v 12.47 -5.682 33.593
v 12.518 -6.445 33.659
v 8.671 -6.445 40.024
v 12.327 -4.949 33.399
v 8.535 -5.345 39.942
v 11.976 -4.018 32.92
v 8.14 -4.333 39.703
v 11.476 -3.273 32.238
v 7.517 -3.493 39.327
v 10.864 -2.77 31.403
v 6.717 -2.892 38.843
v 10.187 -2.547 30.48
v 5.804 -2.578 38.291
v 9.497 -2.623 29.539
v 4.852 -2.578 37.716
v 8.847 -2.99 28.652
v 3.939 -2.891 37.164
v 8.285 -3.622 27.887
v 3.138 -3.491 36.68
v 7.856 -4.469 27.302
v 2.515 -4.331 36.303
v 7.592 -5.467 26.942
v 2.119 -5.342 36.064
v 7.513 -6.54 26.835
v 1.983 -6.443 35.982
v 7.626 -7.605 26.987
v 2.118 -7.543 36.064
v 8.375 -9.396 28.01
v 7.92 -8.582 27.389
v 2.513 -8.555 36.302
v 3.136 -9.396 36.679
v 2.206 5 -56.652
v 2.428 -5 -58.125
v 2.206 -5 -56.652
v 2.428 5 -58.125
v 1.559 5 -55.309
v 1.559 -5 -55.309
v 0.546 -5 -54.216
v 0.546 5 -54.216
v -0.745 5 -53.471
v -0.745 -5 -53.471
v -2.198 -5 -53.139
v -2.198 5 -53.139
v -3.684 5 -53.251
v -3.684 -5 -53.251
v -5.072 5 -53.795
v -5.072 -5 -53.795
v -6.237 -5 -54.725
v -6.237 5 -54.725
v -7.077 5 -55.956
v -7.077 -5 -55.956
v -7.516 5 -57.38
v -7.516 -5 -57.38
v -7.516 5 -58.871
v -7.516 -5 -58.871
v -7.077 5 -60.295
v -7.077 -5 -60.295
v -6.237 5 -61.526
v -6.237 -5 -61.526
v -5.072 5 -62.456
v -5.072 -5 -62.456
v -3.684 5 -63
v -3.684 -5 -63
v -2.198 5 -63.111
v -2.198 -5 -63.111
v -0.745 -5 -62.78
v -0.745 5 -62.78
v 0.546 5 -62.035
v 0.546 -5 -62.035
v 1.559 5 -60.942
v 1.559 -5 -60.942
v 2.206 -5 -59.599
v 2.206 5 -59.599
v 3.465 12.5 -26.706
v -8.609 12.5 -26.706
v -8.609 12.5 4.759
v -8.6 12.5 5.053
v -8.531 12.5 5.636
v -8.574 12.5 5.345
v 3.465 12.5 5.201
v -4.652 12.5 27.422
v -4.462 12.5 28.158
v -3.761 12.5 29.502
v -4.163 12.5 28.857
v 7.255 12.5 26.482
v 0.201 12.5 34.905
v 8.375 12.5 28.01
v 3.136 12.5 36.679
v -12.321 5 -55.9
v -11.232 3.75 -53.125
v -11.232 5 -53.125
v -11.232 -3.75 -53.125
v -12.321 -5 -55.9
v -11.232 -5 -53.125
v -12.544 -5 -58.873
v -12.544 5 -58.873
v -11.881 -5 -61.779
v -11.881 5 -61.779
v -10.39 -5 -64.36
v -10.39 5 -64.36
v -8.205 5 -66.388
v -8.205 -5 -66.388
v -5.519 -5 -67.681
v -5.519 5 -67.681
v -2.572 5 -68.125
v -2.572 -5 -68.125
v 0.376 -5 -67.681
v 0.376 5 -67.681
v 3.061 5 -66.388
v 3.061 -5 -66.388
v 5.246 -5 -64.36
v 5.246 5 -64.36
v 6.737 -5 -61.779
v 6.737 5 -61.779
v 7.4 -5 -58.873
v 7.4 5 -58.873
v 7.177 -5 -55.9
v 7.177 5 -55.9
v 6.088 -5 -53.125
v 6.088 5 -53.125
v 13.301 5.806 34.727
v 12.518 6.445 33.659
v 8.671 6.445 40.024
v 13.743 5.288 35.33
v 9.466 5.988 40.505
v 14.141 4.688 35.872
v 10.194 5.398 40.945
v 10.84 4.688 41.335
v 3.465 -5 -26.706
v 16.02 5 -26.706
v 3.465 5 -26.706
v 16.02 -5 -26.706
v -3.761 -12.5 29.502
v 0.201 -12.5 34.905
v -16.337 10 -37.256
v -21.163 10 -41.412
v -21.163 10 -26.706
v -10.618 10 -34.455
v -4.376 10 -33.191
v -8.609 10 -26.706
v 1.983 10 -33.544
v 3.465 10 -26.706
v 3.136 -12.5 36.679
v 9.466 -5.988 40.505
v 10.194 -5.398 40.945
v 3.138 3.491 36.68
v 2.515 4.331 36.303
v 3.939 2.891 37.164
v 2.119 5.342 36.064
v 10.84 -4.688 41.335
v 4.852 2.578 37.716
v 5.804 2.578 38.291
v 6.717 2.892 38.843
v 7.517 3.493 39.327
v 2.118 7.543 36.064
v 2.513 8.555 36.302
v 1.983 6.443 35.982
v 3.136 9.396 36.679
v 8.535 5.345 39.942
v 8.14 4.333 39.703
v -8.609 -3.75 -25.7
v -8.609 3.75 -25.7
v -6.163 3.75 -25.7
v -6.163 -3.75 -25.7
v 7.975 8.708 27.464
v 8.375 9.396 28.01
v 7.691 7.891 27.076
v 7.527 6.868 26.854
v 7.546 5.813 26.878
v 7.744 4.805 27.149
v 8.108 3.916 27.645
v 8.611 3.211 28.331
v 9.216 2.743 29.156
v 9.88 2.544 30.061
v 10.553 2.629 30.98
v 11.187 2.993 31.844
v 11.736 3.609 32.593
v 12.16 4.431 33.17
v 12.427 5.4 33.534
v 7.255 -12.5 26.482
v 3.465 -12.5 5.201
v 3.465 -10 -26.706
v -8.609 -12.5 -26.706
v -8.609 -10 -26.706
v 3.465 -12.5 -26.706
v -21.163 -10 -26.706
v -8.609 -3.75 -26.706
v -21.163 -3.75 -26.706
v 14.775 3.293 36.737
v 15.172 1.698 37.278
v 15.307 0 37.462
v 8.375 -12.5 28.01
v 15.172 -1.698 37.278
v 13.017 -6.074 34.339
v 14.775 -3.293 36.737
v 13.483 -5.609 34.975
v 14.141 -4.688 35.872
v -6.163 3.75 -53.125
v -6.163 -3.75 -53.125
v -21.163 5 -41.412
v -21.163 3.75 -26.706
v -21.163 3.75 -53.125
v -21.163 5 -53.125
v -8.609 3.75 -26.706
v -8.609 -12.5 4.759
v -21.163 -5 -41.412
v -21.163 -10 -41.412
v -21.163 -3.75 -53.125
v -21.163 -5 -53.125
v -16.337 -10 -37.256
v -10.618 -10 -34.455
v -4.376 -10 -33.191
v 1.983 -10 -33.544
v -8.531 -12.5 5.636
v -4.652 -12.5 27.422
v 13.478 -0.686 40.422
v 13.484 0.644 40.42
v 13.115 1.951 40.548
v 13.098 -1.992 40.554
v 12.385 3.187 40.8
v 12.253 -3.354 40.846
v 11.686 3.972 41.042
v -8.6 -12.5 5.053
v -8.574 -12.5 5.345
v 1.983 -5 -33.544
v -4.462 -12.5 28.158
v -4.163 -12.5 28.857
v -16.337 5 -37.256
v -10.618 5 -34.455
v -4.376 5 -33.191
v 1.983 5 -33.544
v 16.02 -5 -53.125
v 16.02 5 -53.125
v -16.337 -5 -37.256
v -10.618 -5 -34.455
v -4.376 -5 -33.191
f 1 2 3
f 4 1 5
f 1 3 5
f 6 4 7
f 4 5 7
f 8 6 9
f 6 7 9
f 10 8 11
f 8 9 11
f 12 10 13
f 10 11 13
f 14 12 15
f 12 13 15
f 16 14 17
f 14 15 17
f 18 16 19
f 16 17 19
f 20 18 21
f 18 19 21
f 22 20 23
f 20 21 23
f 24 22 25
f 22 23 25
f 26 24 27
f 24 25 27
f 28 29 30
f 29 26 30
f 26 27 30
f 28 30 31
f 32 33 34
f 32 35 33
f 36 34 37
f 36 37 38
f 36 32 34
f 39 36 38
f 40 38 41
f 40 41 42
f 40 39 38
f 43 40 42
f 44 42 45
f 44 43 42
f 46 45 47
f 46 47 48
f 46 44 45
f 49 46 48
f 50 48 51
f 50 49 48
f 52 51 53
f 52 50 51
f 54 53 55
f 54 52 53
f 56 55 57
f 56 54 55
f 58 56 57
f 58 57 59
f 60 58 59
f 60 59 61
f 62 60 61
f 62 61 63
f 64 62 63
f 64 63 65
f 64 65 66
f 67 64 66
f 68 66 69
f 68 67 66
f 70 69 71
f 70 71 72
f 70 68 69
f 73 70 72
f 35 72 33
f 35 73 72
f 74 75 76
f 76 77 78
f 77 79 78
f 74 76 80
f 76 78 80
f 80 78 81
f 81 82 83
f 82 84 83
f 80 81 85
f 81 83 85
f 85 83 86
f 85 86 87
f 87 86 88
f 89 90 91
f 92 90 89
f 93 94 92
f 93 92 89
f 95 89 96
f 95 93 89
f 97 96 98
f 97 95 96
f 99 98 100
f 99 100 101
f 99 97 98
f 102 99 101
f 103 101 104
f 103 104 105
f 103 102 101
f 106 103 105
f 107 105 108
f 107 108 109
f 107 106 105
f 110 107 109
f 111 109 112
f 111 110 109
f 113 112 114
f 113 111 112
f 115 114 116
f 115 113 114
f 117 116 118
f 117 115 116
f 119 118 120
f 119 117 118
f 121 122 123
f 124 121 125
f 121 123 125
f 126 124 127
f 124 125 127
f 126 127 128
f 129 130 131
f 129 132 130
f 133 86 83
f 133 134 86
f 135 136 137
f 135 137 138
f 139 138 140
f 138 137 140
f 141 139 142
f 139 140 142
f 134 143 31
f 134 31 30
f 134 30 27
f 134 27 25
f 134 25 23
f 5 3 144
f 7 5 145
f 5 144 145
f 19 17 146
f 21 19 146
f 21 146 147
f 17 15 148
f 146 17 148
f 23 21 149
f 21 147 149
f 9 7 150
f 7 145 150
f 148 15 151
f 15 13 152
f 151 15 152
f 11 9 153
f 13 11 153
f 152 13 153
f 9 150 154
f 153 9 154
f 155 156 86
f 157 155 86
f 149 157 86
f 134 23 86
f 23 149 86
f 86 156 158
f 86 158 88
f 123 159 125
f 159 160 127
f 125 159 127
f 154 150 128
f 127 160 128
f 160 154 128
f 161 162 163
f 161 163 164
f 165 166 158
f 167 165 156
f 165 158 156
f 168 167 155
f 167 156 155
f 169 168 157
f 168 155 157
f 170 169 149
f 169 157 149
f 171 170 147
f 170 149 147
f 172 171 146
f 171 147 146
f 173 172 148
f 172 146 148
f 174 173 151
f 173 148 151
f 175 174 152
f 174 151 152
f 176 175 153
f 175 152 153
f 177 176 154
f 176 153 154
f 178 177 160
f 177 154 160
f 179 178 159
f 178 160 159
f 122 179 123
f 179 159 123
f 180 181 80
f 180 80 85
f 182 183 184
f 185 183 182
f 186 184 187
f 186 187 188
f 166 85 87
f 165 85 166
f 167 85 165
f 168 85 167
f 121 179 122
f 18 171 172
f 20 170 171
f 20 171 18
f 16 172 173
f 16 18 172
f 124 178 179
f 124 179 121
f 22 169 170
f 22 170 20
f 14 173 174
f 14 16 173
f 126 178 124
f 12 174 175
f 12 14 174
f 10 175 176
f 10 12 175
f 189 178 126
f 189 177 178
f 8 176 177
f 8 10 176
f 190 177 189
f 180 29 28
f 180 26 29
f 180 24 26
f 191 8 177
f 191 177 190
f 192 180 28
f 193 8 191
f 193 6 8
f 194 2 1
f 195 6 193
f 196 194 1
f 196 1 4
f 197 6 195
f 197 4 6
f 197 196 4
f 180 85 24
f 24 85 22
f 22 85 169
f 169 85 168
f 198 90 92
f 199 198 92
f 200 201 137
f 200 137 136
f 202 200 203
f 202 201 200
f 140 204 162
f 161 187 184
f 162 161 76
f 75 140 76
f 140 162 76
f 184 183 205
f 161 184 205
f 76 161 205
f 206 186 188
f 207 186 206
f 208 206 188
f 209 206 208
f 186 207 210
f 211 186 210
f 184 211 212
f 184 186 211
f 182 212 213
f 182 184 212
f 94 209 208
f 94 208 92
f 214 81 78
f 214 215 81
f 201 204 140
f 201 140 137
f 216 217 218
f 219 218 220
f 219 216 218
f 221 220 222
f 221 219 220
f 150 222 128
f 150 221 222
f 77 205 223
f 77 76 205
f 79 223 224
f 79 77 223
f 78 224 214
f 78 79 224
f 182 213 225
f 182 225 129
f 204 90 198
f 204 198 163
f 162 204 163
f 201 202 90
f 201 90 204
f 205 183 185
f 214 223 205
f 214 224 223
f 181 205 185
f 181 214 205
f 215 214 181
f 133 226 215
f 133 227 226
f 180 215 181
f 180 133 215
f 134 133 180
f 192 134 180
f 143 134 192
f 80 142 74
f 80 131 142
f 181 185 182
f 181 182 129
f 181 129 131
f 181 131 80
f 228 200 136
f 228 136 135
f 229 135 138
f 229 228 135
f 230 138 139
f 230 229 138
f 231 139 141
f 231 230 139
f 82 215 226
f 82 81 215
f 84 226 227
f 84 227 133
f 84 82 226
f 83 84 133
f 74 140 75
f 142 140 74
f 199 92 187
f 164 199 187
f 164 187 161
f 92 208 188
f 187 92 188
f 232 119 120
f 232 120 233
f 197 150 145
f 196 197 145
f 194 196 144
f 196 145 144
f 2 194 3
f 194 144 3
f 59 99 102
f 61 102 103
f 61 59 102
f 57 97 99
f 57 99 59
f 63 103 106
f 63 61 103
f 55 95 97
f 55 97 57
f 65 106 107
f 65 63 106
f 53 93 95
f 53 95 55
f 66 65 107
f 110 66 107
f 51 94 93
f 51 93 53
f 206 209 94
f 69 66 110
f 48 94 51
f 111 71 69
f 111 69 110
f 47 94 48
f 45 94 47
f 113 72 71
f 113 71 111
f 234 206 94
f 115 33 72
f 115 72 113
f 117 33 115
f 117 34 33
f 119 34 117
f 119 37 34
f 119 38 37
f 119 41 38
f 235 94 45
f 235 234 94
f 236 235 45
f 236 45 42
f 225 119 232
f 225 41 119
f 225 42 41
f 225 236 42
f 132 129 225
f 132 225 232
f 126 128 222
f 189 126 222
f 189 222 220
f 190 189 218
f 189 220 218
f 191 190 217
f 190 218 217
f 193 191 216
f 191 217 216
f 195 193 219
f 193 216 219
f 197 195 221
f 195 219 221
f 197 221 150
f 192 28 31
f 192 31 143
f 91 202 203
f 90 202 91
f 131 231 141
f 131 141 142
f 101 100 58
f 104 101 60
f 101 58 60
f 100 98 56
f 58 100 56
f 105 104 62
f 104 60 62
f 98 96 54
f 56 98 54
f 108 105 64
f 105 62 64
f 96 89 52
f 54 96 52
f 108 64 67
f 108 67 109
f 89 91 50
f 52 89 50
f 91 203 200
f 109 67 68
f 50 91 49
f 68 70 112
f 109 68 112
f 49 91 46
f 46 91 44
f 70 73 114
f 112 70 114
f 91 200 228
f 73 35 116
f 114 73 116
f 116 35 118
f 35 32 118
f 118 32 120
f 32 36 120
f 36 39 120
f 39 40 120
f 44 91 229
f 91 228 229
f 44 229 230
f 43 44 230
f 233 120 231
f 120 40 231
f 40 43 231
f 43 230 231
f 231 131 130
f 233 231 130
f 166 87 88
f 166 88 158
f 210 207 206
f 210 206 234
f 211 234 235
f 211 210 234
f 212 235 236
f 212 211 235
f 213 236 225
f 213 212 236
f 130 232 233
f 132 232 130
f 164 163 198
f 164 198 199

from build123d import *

# Parameters (mm, degrees)
F1_DEPTH = 10
F0_R     = 5
F2_DEPTH = 5
F0_W     = 12.0738212518
F0_H     = 31.9068175741
F3_DEPTH = 12.5
F4_R     = 5
F5_SIZE2 = 5
F5_SIZE  = 10
F7_DEPTH = 25
F8_W     = 7.5
F8_H     = 27.4257330972
F9_DEPTH = 15


with BuildPart() as f1:
    # F0 (on Front) → F1 (new body, symmetric)
    with BuildSketch(Plane.XZ):
        with BuildLine():
            Line((-21.1634319276, -26.7058201134), (-21.1634319276, -41.4115685539))
            ThreePointArc((-21.1634319276, -41.4115685539), (-10.6175206449, -34.455488704), (1.9829672237, -33.5438982608))
            Line((1.9829672237, -33.5438982608), (3.4650283433, -26.7058201134))
            Line((3.4650283433, -26.7058201134), (-8.6087929085, -26.7058201134))
            Line((-8.6087929085, -26.7058201134), (-21.1634319276, -26.7058201134))
        make_face()
    extrude(amount=F1_DEPTH, both=True)

    # F0 (on Front) → F2 (join, symmetric)
    with BuildSketch(Plane.XZ):
        with BuildLine():
            Line((-21.1634319276, -41.4115685539), (-21.1634319276, -53.1254634261))
            Line((-21.1634319276, -53.1254634261), (-19.8923903583, -53.1254634261))
            Line((-19.8923903583, -53.1254634261), (-11.2321363204, -53.1254634261))
            ThreePointArc((-11.2321363204, -53.1254634261), (-2.5718822826, -68.1254634261), (6.0883717553, -53.1254634261))
            Line((6.0883717553, -53.1254634261), (14.7486257931, -53.1254634261))
            Line((14.7486257931, -53.1254634261), (16.0196673624, -53.1254634261))
            Line((16.0196673624, -53.1254634261), (16.0196673624, -41.4115685539))
            ThreePointArc((16.0196673624, -41.4115685539), (9.6516199724, -36.3175292593), (1.9829672237, -33.5438982608))
            ThreePointArc((1.9829672237, -33.5438982608), (-10.6175206449, -34.455488704), (-21.1634319276, -41.4115685539))
        make_face()
        with Locations((-2.5718822826, -58.1254634261)):
            Circle(F0_R, mode=Mode.SUBTRACT)
        with BuildLine():
            Line((3.4650283433, -26.7058201134), (1.9829672237, -33.5438982608))
            ThreePointArc((1.9829672237, -33.5438982608), (9.6516199724, -36.3175292593), (16.0196673624, -41.4115685539))
            Line((16.0196673624, -41.4115685539), (16.0196673624, -26.7058201134))
            Line((16.0196673624, -26.7058201134), (3.4650283433, -26.7058201134))
        make_face()
    extrude(amount=F2_DEPTH, both=True)

    # F0 (on Front) → F3 (join, symmetric)
    with BuildSketch(Plane.XZ):
        with Locations((-2.5718822826, -10.7524113264)):
            Rectangle(F0_W, F0_H)
        Polygon((-4.447942134, 28.565781191), (-8.6087929085, 5.2009974606), (3.4650283433, 5.2009974606), (7.2547487569, 26.4817409097), align=None)
        Polygon((6.1142202467, 42.9687313735), (-4.447942134, 28.565781191), (7.2547487569, 26.4817409097), (16.6688518649, 39.3191555594), align=None)
    extrude(amount=F3_DEPTH, both=True)

    # F4
    f4_edges = [f1.edges().sort_by_distance(p)[0] for p in [
        (-8.608793, 0, 5.200997),
        (-4.447942, 0, 28.565781),
    ]]
    fillet(f4_edges, radius=F4_R)

    # F5
    f5_edges = [f1.edges().sort_by_distance(p)[0] for p in [
        (6.11422, 0, 42.968731),
    ]]
    f5_side = f1.faces().sort_by_distance((1.176582, 0, 36.235587))[0]
    chamfer(f5_edges, length=F5_SIZE, length2=F5_SIZE2, reference=f5_side)

    # F6 (on face) → F7 (cut)
    with BuildSketch(Plane(origin=(-15.3979489719, 0, 25.4772253764), x_dir=(0.8558343717, 0, 0.5172499669), z_dir=(-0.5172499669, 0, 0.8558343717))):
        with BuildLine():
            Line((30.657387603, 12.5), (30.657387603, 4.6880120664))
            ThreePointArc((30.657387603, 4.6880120664), (32.4777582205, 0), (30.657387603, -4.6880120664))
            Line((30.657387603, -4.6880120664), (30.657387603, -12.5))
            Line((30.657387603, -12.5), (39.1792431474, -12.5))
            Line((39.1792431474, -12.5), (39.1792431474, 12.5))
            Line((39.1792431474, 12.5), (30.657387603, 12.5))
        make_face()
        with BuildLine():
            Line((21.6556563973, 12.5), (21.6556563973, 9.3958744477))
            ThreePointArc((21.6556563973, 9.3958744477), (22.5944314954, 2.8906144363), (28.1230778906, 6.445016712))
            ThreePointArc((28.1230778906, 6.445016712), (29.4889605189, 5.7089196767), (30.657387603, 4.6880120664))
            Line((30.657387603, 4.6880120664), (30.657387603, 12.5))
            Line((30.657387603, 12.5), (21.6556563973, 12.5))
        make_face()
        with BuildLine():
            Line((30.657387603, -12.5), (30.657387603, -4.6880120664))
            ThreePointArc((30.657387603, -4.6880120664), (29.4889605189, -5.7089196767), (28.1230778906, -6.445016712))
            ThreePointArc((28.1230778906, -6.445016712), (22.5944314954, -2.8906144363), (21.6556563973, -9.3958744477))
            Line((21.6556563973, -9.3958744477), (21.6556563973, -12.5))
            Line((21.6556563973, -12.5), (30.657387603, -12.5))
        make_face()
    extrude(amount=-F7_DEPTH, mode=Mode.SUBTRACT)

    # F8 (on face) → F9 (cut)
    with BuildSketch(Plane(origin=(-21.1634319276, 0, 0), x_dir=(0, -1, 0), z_dir=(-1, 0, 0))):
        with Locations((0, -39.4125968775)):
            Rectangle(F8_W, F8_H)
    extrude(amount=-F9_DEPTH, mode=Mode.SUBTRACT)


solid = f1.part
